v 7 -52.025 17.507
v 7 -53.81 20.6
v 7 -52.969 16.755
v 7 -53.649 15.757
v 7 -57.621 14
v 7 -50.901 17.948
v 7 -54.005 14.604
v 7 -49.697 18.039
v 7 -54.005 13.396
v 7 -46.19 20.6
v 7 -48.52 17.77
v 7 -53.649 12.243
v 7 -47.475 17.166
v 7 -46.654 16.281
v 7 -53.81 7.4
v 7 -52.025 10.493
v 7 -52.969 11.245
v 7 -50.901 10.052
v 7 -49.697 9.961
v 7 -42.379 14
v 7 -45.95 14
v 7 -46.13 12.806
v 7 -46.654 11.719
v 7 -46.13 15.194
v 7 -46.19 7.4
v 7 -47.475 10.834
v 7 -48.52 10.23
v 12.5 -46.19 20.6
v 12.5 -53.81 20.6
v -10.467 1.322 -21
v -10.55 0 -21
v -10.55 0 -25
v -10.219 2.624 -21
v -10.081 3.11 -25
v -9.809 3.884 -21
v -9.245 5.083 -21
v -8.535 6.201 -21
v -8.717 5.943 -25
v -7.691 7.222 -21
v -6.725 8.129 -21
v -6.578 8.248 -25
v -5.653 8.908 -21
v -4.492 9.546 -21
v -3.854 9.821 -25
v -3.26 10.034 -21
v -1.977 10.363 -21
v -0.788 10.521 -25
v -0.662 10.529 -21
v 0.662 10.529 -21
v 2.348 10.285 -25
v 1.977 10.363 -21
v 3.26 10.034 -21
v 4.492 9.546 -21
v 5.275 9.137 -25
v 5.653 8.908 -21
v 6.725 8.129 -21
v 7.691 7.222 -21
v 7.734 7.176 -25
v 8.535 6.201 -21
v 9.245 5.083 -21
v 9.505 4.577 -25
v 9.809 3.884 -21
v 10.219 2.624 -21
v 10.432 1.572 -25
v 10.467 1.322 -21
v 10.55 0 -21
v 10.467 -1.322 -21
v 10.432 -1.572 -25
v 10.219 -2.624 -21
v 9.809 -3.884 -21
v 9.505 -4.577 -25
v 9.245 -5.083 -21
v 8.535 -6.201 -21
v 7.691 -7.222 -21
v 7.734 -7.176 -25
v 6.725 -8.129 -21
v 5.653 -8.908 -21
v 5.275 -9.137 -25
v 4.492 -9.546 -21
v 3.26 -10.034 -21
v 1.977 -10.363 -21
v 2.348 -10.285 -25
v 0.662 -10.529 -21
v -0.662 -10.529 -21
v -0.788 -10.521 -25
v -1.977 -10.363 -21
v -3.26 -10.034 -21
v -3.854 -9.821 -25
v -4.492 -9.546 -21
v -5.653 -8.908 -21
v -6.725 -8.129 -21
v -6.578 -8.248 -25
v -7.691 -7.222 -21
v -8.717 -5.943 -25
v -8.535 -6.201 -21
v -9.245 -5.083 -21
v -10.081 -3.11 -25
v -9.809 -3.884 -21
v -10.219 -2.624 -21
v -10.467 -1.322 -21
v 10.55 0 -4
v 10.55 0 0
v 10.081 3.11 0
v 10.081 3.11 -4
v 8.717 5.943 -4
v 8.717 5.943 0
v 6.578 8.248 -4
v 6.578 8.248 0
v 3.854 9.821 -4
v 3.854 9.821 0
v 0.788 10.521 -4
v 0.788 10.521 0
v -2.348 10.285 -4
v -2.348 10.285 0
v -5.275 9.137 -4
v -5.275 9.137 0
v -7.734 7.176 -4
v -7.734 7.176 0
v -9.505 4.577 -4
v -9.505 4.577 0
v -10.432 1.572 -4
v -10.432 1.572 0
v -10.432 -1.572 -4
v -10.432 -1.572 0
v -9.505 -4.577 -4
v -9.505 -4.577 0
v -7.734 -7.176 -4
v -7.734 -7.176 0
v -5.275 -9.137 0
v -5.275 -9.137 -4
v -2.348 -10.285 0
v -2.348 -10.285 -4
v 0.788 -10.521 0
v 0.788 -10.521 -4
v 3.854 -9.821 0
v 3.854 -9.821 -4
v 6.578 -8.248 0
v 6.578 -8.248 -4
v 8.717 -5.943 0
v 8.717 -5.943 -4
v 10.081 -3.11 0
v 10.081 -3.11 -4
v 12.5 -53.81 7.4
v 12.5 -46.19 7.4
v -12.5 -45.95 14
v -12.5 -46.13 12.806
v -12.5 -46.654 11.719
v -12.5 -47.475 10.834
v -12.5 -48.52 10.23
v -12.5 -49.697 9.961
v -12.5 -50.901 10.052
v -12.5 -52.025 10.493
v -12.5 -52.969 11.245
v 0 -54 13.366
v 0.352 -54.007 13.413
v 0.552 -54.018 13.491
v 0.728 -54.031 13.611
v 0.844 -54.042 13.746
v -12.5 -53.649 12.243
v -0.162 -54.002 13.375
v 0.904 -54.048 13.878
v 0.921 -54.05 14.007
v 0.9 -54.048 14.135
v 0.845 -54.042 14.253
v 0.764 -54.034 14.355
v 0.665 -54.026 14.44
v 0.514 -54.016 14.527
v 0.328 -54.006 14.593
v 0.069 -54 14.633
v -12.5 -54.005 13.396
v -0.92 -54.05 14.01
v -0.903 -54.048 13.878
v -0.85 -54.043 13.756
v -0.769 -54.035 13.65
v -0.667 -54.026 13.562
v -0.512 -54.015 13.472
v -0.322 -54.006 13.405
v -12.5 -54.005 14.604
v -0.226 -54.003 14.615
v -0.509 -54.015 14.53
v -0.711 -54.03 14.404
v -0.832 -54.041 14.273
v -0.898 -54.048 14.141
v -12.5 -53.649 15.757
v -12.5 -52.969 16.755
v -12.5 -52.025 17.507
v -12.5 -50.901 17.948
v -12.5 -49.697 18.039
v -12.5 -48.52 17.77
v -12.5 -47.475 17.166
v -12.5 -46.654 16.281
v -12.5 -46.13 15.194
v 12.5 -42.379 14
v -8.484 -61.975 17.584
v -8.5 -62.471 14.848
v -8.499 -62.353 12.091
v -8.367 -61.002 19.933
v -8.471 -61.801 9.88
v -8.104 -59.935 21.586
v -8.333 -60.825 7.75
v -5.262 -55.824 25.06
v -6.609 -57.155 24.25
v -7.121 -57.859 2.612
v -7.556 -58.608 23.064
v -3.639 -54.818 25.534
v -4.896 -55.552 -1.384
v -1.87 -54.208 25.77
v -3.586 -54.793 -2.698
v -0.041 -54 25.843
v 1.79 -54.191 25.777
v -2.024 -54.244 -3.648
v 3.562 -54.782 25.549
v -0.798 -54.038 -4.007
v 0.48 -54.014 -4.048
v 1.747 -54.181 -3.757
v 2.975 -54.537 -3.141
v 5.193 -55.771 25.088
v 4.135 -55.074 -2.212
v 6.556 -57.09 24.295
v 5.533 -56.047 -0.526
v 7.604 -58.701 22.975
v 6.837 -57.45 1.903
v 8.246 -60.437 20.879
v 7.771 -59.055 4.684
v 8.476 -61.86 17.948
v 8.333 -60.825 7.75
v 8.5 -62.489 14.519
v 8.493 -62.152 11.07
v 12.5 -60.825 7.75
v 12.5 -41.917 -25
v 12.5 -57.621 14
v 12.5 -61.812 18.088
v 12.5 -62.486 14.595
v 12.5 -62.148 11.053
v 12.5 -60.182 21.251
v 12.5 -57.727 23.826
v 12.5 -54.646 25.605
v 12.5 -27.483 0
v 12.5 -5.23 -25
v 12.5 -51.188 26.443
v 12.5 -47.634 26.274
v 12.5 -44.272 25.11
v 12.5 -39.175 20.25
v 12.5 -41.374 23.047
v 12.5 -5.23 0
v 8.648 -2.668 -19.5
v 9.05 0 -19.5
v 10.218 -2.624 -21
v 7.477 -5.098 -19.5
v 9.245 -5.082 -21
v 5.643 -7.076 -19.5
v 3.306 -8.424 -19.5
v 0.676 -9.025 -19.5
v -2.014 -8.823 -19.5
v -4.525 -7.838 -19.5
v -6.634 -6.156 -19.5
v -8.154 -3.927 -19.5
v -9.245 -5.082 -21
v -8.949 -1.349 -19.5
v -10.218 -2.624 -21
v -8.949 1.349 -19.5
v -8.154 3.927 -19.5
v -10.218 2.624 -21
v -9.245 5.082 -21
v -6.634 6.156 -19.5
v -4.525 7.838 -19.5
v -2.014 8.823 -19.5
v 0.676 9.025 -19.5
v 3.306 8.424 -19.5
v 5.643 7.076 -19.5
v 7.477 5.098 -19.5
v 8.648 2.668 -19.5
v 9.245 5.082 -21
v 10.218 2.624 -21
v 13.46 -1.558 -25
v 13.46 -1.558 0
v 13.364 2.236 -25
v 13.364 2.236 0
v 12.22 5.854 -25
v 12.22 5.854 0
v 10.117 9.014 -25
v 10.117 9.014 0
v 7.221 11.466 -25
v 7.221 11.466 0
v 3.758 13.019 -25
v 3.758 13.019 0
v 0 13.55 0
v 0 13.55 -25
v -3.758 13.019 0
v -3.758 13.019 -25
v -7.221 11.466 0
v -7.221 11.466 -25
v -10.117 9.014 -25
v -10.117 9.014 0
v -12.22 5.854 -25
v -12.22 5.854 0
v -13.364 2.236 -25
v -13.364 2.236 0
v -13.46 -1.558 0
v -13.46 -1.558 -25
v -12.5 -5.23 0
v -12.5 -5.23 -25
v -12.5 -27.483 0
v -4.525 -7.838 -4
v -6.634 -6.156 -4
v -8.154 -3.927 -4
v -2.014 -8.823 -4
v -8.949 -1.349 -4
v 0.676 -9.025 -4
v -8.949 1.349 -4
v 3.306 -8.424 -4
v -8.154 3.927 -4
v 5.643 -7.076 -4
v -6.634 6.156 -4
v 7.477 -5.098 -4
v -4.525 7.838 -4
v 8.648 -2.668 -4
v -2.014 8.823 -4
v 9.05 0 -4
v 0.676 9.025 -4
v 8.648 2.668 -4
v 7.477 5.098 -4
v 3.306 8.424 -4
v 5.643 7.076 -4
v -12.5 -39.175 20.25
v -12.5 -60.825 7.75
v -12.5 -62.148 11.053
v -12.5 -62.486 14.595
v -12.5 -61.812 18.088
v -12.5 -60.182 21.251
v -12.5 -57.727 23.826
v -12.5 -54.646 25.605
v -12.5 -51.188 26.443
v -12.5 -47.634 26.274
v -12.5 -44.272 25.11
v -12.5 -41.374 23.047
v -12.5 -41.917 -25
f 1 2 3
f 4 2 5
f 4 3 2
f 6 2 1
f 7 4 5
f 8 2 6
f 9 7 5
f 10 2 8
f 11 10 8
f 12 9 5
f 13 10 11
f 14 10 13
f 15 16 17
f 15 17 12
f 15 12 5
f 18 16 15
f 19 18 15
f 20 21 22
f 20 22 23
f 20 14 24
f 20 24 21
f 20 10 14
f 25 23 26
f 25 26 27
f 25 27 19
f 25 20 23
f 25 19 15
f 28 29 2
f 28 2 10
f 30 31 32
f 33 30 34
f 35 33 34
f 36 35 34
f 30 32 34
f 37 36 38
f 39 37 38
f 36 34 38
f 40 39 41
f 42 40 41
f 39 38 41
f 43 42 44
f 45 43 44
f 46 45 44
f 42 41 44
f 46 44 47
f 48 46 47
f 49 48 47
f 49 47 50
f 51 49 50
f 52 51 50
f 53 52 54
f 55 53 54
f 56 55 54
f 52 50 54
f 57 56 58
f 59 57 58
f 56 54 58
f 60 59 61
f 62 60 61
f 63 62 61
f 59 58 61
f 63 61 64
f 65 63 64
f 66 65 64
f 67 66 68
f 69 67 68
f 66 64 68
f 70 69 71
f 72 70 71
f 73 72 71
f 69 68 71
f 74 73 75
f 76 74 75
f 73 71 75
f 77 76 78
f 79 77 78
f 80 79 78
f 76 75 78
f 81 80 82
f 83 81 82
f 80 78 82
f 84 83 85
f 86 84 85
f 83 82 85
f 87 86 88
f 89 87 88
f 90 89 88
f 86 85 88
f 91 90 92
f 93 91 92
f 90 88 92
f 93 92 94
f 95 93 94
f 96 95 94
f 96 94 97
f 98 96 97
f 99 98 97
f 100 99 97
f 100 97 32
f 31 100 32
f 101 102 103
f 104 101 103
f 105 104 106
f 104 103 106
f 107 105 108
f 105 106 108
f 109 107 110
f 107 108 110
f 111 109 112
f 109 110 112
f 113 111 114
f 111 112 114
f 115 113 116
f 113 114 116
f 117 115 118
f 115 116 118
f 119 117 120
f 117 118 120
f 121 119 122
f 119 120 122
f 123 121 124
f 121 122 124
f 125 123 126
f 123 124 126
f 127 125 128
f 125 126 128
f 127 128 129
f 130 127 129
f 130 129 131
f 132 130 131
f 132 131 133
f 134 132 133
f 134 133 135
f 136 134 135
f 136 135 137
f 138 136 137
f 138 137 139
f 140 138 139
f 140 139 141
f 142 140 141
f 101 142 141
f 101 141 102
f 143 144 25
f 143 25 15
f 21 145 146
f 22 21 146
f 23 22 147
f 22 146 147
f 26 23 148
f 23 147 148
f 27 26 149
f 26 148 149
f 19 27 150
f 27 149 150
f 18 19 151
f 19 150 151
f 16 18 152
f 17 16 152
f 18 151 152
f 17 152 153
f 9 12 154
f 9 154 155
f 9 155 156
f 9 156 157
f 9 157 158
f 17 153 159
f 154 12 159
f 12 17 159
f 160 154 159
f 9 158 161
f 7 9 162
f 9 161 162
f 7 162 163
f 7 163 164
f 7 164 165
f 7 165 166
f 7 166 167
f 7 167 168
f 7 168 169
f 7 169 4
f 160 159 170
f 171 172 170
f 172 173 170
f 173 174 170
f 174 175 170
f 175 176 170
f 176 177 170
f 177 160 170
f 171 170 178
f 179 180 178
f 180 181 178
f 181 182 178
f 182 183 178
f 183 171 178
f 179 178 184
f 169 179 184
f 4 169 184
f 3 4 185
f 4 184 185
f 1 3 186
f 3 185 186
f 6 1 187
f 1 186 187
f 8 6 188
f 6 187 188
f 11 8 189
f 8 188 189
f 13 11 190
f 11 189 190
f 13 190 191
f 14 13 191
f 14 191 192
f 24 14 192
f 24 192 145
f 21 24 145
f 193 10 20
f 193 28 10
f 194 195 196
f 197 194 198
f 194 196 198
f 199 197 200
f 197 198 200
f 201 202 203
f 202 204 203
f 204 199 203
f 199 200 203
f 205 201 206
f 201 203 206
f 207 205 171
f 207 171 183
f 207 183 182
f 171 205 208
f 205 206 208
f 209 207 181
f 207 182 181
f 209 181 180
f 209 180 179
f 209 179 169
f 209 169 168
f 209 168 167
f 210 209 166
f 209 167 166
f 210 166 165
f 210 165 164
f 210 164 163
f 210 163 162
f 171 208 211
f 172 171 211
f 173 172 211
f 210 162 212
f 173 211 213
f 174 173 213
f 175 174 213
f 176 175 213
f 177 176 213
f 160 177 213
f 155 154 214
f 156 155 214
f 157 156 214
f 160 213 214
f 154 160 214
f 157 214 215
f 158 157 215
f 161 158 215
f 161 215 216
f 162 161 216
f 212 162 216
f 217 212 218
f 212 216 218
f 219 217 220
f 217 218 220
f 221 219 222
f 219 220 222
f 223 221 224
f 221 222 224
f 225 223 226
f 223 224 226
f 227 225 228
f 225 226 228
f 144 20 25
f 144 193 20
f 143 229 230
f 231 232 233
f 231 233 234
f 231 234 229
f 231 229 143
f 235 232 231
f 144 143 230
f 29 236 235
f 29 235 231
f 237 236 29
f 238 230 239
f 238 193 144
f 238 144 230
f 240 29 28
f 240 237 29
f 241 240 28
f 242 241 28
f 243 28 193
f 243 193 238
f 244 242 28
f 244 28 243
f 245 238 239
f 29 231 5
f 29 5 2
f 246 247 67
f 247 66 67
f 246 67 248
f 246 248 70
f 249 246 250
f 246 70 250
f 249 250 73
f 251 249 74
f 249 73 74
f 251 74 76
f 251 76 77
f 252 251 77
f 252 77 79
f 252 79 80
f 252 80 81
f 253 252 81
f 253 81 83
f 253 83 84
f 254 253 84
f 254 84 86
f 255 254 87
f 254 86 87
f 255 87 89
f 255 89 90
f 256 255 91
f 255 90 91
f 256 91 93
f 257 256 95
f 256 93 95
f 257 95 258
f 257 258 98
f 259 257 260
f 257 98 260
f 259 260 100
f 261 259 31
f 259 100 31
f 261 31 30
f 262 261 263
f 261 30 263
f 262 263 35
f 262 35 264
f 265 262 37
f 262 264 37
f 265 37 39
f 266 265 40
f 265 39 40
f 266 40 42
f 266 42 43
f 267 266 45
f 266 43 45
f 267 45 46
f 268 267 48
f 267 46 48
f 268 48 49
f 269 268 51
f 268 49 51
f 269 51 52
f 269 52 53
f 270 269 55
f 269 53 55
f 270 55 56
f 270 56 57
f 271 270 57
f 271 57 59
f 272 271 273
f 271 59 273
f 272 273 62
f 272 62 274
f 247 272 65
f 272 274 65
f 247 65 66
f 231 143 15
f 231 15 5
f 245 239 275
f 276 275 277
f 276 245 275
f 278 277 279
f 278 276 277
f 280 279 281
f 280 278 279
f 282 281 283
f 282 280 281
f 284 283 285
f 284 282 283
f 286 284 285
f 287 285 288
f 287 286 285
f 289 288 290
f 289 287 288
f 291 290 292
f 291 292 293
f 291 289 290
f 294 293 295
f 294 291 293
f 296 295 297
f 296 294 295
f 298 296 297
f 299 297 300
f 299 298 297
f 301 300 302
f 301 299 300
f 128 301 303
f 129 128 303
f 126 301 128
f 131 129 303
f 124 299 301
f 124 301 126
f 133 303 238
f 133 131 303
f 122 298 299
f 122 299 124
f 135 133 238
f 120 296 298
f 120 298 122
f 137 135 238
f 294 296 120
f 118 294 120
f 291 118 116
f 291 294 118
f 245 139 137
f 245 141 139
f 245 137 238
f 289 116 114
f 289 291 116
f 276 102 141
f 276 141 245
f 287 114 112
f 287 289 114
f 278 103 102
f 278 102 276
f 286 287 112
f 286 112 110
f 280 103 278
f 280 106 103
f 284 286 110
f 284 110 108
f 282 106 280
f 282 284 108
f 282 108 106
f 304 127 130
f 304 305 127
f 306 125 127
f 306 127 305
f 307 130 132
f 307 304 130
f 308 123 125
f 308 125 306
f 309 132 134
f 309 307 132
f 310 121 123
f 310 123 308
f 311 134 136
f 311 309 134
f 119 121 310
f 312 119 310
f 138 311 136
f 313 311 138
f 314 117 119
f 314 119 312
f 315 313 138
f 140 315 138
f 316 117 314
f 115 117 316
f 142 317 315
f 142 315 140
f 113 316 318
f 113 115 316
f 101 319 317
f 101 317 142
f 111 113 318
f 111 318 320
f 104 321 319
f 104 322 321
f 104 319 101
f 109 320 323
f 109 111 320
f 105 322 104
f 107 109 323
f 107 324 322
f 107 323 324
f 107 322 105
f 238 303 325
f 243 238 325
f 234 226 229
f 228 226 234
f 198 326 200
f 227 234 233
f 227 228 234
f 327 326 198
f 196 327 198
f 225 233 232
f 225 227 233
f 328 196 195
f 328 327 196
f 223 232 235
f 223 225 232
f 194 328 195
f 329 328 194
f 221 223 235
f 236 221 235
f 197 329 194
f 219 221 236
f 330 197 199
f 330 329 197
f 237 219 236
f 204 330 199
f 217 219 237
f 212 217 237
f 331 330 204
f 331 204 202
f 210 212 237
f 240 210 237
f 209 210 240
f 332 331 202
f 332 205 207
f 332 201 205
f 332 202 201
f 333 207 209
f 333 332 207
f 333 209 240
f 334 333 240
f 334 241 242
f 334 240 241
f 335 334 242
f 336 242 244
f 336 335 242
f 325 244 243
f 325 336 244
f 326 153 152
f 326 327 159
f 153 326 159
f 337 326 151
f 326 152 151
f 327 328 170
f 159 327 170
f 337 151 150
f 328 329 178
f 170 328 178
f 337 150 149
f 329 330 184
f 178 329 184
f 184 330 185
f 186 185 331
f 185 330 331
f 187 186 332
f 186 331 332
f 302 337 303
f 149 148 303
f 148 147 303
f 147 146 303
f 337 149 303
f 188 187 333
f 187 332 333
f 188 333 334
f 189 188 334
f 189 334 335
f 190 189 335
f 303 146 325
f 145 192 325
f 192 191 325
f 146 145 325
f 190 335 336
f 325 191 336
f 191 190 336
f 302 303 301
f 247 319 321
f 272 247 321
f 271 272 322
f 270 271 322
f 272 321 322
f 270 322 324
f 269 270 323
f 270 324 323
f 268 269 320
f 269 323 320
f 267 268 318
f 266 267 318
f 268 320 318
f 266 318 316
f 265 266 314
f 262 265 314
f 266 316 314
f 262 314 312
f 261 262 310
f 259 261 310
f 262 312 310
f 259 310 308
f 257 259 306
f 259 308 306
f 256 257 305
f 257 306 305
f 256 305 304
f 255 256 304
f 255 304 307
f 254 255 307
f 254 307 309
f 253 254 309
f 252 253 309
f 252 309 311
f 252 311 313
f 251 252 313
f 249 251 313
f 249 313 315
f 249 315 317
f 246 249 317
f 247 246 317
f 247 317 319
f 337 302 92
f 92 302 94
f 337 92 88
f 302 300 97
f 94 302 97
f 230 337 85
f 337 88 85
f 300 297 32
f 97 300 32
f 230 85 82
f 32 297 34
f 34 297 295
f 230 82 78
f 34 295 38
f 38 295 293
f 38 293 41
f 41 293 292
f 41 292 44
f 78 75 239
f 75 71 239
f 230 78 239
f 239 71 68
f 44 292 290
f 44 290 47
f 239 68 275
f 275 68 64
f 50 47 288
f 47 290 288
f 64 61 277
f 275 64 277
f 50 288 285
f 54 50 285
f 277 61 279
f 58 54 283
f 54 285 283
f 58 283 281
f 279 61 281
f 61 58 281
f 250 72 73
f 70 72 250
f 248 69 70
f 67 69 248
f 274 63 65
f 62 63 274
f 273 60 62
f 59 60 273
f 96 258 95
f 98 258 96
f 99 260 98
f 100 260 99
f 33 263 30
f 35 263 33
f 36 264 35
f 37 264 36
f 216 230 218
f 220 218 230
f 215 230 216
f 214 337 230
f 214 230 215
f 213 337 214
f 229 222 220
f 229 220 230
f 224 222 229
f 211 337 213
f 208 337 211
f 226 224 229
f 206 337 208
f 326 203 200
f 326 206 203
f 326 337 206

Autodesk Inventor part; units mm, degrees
ref_plane "YZ Plane" through (0, 0, 0) normal (1, 0, 0) x (0, 1, 0)
ref_plane "XZ Plane" through (0, 0, 0) normal (0, 1, 0) x (-1, 0, 0)
ref_plane "XY Plane" through (0, 0, 0) normal (0, 0, 1) x (1, 0, 0)
sketch "Sketch1" plane through (0, 0, 0) normal (1, 0, 0) x (0, 1, 0)
  circle A0 centre (-50, 14) radius 4.05
  arc A1 (-39.1747, 20.25) -> (-60.8253, 7.75) centre (-50, 14) ccw
  line L0 (0, 0) -> (0, -25)
  line L1 (0, -25) -> (-41.9171, -25)
  line L2 (-41.9171, -25) -> (-60.8253, 7.75)
  line L3 (0, 0) -> (-27.4833, 0)
  line L4 (-27.4833, 0) -> (-39.1747, 20.25)
  dimension "d0" = 8.1
  dimension "d2" = 50
  dimension "d3" = 14
  dimension "d4" = 25
  dimension "d6" = 25
  dimension "d40" = 120
extrude "Extrusion1" add sketch "Sketch1" along normal mid plane 25
sketch "Sketch2" plane through (-12.5, -27.4833, 0) normal (0, 0, 1) x (1, 0, 0)
  circle A0 centre (12.5, 27.4833) radius 12.5
extrude "Extrusion2" add sketch "Sketch2" against normal up to surface (25 mm away)
sketch "Sketch13" plane through (-12.5, -27.4833, 0) normal (0, 0, 1) x (1, 0, 0)
  arc A0 (25, 27.4833) -> (0, 27.4833) centre (12.5, 27.4833) ccw projected
  circle A1 centre (12.5, 27.4833) radius 9.05
  dimension "d59" = 18.1
extrude "Extrusion13" cut sketch "Sketch13" against normal through all
sketch "Sketch14" plane through (-12.5, -27.4833, 0) normal (0, 0, 1) x (1, 0, 0)
  circle A0 centre (12.5, 27.4833) radius 9.05 projected
  arc A1 (25, 27.4833) -> (0, 27.4833) centre (12.5, 27.4833) ccw projected
  circle A2 centre (12.5, 27.4833) radius 10.55
  dimension "d63" = 21.1
extrude "Extrusion14" cut sketch "Sketch14" against normal blind 4
sketch "Sketch15" plane through (12.5, -41.9171, -25) normal (0, 0, -1) x (-1, 0, 0)
  circle A0 centre (12.5, 41.9171) radius 9.05 projected
  arc A1 (25, 41.9171) -> (0, 41.9171) centre (12.5, 41.9171) ccw projected
  circle A2 centre (12.5, 41.9171) radius 10.55
  dimension "d67" = 21.1
extrude "Extrusion15" cut sketch "Sketch15" against normal blind 4
chamfer "Chamfer4" distance 1.5 angle 45 1 edges at (-9.05, 0, -21)
sketch "Sketch16" plane through (-12.5, -27.4833, 0) normal (0, 0, 1) x (1, 0, 0)
  circle A0 centre (12.5, 27.4833) radius 10.55 projected
  arc A1 (25, 27.4833) -> (0, 27.4833) centre (12.5, 27.4833) ccw projected
  circle A2 centre (12.5, 27.4833) radius 13.55
  dimension "d76" = 3
extrude "Extrusion16" add sketch "Sketch16" against normal up to surface (25 mm away)
sketch "Sketch17" plane through (12.5, 0, 0) normal (1, 0, 0) x (0, 0, -1)
  arc A0 (-19.5, -40.4737) -> (-8.5, -59.5263) centre (-14, -50) ccw projected
  line L0 (-14, -42.379) -> (-7.4, -46.1895)
  line L1 (-7.4, -46.1895) -> (-7.4, -53.8105)
  line L2 (-7.4, -53.8105) -> (-14, -57.621)
  line L3 (-14, -57.621) -> (-20.6, -53.8105)
  line L4 (-20.6, -53.8105) -> (-20.6, -46.1895)
  line L5 (-20.6, -46.1895) -> (-14, -42.379)
  point P0 (0, 0)
  dimension "d80" = 13.2
extrude "Extrusion17" cut sketch "Sketch17" against normal blind 5.5
sketch "Sketch18" plane through (12.5, -41.9171, -25) normal (0, 0, -1) x (-1, 0, 0)
  line L0 (25, -20.5829) -> (0, -20.5829) projected
  circle A0 centre (12.5, -20.5829) radius 8.5
  dimension "d83" = 17
extrude "Extrusion18" cut sketch "Sketch18" against normal through all
properties part number "hub top"
